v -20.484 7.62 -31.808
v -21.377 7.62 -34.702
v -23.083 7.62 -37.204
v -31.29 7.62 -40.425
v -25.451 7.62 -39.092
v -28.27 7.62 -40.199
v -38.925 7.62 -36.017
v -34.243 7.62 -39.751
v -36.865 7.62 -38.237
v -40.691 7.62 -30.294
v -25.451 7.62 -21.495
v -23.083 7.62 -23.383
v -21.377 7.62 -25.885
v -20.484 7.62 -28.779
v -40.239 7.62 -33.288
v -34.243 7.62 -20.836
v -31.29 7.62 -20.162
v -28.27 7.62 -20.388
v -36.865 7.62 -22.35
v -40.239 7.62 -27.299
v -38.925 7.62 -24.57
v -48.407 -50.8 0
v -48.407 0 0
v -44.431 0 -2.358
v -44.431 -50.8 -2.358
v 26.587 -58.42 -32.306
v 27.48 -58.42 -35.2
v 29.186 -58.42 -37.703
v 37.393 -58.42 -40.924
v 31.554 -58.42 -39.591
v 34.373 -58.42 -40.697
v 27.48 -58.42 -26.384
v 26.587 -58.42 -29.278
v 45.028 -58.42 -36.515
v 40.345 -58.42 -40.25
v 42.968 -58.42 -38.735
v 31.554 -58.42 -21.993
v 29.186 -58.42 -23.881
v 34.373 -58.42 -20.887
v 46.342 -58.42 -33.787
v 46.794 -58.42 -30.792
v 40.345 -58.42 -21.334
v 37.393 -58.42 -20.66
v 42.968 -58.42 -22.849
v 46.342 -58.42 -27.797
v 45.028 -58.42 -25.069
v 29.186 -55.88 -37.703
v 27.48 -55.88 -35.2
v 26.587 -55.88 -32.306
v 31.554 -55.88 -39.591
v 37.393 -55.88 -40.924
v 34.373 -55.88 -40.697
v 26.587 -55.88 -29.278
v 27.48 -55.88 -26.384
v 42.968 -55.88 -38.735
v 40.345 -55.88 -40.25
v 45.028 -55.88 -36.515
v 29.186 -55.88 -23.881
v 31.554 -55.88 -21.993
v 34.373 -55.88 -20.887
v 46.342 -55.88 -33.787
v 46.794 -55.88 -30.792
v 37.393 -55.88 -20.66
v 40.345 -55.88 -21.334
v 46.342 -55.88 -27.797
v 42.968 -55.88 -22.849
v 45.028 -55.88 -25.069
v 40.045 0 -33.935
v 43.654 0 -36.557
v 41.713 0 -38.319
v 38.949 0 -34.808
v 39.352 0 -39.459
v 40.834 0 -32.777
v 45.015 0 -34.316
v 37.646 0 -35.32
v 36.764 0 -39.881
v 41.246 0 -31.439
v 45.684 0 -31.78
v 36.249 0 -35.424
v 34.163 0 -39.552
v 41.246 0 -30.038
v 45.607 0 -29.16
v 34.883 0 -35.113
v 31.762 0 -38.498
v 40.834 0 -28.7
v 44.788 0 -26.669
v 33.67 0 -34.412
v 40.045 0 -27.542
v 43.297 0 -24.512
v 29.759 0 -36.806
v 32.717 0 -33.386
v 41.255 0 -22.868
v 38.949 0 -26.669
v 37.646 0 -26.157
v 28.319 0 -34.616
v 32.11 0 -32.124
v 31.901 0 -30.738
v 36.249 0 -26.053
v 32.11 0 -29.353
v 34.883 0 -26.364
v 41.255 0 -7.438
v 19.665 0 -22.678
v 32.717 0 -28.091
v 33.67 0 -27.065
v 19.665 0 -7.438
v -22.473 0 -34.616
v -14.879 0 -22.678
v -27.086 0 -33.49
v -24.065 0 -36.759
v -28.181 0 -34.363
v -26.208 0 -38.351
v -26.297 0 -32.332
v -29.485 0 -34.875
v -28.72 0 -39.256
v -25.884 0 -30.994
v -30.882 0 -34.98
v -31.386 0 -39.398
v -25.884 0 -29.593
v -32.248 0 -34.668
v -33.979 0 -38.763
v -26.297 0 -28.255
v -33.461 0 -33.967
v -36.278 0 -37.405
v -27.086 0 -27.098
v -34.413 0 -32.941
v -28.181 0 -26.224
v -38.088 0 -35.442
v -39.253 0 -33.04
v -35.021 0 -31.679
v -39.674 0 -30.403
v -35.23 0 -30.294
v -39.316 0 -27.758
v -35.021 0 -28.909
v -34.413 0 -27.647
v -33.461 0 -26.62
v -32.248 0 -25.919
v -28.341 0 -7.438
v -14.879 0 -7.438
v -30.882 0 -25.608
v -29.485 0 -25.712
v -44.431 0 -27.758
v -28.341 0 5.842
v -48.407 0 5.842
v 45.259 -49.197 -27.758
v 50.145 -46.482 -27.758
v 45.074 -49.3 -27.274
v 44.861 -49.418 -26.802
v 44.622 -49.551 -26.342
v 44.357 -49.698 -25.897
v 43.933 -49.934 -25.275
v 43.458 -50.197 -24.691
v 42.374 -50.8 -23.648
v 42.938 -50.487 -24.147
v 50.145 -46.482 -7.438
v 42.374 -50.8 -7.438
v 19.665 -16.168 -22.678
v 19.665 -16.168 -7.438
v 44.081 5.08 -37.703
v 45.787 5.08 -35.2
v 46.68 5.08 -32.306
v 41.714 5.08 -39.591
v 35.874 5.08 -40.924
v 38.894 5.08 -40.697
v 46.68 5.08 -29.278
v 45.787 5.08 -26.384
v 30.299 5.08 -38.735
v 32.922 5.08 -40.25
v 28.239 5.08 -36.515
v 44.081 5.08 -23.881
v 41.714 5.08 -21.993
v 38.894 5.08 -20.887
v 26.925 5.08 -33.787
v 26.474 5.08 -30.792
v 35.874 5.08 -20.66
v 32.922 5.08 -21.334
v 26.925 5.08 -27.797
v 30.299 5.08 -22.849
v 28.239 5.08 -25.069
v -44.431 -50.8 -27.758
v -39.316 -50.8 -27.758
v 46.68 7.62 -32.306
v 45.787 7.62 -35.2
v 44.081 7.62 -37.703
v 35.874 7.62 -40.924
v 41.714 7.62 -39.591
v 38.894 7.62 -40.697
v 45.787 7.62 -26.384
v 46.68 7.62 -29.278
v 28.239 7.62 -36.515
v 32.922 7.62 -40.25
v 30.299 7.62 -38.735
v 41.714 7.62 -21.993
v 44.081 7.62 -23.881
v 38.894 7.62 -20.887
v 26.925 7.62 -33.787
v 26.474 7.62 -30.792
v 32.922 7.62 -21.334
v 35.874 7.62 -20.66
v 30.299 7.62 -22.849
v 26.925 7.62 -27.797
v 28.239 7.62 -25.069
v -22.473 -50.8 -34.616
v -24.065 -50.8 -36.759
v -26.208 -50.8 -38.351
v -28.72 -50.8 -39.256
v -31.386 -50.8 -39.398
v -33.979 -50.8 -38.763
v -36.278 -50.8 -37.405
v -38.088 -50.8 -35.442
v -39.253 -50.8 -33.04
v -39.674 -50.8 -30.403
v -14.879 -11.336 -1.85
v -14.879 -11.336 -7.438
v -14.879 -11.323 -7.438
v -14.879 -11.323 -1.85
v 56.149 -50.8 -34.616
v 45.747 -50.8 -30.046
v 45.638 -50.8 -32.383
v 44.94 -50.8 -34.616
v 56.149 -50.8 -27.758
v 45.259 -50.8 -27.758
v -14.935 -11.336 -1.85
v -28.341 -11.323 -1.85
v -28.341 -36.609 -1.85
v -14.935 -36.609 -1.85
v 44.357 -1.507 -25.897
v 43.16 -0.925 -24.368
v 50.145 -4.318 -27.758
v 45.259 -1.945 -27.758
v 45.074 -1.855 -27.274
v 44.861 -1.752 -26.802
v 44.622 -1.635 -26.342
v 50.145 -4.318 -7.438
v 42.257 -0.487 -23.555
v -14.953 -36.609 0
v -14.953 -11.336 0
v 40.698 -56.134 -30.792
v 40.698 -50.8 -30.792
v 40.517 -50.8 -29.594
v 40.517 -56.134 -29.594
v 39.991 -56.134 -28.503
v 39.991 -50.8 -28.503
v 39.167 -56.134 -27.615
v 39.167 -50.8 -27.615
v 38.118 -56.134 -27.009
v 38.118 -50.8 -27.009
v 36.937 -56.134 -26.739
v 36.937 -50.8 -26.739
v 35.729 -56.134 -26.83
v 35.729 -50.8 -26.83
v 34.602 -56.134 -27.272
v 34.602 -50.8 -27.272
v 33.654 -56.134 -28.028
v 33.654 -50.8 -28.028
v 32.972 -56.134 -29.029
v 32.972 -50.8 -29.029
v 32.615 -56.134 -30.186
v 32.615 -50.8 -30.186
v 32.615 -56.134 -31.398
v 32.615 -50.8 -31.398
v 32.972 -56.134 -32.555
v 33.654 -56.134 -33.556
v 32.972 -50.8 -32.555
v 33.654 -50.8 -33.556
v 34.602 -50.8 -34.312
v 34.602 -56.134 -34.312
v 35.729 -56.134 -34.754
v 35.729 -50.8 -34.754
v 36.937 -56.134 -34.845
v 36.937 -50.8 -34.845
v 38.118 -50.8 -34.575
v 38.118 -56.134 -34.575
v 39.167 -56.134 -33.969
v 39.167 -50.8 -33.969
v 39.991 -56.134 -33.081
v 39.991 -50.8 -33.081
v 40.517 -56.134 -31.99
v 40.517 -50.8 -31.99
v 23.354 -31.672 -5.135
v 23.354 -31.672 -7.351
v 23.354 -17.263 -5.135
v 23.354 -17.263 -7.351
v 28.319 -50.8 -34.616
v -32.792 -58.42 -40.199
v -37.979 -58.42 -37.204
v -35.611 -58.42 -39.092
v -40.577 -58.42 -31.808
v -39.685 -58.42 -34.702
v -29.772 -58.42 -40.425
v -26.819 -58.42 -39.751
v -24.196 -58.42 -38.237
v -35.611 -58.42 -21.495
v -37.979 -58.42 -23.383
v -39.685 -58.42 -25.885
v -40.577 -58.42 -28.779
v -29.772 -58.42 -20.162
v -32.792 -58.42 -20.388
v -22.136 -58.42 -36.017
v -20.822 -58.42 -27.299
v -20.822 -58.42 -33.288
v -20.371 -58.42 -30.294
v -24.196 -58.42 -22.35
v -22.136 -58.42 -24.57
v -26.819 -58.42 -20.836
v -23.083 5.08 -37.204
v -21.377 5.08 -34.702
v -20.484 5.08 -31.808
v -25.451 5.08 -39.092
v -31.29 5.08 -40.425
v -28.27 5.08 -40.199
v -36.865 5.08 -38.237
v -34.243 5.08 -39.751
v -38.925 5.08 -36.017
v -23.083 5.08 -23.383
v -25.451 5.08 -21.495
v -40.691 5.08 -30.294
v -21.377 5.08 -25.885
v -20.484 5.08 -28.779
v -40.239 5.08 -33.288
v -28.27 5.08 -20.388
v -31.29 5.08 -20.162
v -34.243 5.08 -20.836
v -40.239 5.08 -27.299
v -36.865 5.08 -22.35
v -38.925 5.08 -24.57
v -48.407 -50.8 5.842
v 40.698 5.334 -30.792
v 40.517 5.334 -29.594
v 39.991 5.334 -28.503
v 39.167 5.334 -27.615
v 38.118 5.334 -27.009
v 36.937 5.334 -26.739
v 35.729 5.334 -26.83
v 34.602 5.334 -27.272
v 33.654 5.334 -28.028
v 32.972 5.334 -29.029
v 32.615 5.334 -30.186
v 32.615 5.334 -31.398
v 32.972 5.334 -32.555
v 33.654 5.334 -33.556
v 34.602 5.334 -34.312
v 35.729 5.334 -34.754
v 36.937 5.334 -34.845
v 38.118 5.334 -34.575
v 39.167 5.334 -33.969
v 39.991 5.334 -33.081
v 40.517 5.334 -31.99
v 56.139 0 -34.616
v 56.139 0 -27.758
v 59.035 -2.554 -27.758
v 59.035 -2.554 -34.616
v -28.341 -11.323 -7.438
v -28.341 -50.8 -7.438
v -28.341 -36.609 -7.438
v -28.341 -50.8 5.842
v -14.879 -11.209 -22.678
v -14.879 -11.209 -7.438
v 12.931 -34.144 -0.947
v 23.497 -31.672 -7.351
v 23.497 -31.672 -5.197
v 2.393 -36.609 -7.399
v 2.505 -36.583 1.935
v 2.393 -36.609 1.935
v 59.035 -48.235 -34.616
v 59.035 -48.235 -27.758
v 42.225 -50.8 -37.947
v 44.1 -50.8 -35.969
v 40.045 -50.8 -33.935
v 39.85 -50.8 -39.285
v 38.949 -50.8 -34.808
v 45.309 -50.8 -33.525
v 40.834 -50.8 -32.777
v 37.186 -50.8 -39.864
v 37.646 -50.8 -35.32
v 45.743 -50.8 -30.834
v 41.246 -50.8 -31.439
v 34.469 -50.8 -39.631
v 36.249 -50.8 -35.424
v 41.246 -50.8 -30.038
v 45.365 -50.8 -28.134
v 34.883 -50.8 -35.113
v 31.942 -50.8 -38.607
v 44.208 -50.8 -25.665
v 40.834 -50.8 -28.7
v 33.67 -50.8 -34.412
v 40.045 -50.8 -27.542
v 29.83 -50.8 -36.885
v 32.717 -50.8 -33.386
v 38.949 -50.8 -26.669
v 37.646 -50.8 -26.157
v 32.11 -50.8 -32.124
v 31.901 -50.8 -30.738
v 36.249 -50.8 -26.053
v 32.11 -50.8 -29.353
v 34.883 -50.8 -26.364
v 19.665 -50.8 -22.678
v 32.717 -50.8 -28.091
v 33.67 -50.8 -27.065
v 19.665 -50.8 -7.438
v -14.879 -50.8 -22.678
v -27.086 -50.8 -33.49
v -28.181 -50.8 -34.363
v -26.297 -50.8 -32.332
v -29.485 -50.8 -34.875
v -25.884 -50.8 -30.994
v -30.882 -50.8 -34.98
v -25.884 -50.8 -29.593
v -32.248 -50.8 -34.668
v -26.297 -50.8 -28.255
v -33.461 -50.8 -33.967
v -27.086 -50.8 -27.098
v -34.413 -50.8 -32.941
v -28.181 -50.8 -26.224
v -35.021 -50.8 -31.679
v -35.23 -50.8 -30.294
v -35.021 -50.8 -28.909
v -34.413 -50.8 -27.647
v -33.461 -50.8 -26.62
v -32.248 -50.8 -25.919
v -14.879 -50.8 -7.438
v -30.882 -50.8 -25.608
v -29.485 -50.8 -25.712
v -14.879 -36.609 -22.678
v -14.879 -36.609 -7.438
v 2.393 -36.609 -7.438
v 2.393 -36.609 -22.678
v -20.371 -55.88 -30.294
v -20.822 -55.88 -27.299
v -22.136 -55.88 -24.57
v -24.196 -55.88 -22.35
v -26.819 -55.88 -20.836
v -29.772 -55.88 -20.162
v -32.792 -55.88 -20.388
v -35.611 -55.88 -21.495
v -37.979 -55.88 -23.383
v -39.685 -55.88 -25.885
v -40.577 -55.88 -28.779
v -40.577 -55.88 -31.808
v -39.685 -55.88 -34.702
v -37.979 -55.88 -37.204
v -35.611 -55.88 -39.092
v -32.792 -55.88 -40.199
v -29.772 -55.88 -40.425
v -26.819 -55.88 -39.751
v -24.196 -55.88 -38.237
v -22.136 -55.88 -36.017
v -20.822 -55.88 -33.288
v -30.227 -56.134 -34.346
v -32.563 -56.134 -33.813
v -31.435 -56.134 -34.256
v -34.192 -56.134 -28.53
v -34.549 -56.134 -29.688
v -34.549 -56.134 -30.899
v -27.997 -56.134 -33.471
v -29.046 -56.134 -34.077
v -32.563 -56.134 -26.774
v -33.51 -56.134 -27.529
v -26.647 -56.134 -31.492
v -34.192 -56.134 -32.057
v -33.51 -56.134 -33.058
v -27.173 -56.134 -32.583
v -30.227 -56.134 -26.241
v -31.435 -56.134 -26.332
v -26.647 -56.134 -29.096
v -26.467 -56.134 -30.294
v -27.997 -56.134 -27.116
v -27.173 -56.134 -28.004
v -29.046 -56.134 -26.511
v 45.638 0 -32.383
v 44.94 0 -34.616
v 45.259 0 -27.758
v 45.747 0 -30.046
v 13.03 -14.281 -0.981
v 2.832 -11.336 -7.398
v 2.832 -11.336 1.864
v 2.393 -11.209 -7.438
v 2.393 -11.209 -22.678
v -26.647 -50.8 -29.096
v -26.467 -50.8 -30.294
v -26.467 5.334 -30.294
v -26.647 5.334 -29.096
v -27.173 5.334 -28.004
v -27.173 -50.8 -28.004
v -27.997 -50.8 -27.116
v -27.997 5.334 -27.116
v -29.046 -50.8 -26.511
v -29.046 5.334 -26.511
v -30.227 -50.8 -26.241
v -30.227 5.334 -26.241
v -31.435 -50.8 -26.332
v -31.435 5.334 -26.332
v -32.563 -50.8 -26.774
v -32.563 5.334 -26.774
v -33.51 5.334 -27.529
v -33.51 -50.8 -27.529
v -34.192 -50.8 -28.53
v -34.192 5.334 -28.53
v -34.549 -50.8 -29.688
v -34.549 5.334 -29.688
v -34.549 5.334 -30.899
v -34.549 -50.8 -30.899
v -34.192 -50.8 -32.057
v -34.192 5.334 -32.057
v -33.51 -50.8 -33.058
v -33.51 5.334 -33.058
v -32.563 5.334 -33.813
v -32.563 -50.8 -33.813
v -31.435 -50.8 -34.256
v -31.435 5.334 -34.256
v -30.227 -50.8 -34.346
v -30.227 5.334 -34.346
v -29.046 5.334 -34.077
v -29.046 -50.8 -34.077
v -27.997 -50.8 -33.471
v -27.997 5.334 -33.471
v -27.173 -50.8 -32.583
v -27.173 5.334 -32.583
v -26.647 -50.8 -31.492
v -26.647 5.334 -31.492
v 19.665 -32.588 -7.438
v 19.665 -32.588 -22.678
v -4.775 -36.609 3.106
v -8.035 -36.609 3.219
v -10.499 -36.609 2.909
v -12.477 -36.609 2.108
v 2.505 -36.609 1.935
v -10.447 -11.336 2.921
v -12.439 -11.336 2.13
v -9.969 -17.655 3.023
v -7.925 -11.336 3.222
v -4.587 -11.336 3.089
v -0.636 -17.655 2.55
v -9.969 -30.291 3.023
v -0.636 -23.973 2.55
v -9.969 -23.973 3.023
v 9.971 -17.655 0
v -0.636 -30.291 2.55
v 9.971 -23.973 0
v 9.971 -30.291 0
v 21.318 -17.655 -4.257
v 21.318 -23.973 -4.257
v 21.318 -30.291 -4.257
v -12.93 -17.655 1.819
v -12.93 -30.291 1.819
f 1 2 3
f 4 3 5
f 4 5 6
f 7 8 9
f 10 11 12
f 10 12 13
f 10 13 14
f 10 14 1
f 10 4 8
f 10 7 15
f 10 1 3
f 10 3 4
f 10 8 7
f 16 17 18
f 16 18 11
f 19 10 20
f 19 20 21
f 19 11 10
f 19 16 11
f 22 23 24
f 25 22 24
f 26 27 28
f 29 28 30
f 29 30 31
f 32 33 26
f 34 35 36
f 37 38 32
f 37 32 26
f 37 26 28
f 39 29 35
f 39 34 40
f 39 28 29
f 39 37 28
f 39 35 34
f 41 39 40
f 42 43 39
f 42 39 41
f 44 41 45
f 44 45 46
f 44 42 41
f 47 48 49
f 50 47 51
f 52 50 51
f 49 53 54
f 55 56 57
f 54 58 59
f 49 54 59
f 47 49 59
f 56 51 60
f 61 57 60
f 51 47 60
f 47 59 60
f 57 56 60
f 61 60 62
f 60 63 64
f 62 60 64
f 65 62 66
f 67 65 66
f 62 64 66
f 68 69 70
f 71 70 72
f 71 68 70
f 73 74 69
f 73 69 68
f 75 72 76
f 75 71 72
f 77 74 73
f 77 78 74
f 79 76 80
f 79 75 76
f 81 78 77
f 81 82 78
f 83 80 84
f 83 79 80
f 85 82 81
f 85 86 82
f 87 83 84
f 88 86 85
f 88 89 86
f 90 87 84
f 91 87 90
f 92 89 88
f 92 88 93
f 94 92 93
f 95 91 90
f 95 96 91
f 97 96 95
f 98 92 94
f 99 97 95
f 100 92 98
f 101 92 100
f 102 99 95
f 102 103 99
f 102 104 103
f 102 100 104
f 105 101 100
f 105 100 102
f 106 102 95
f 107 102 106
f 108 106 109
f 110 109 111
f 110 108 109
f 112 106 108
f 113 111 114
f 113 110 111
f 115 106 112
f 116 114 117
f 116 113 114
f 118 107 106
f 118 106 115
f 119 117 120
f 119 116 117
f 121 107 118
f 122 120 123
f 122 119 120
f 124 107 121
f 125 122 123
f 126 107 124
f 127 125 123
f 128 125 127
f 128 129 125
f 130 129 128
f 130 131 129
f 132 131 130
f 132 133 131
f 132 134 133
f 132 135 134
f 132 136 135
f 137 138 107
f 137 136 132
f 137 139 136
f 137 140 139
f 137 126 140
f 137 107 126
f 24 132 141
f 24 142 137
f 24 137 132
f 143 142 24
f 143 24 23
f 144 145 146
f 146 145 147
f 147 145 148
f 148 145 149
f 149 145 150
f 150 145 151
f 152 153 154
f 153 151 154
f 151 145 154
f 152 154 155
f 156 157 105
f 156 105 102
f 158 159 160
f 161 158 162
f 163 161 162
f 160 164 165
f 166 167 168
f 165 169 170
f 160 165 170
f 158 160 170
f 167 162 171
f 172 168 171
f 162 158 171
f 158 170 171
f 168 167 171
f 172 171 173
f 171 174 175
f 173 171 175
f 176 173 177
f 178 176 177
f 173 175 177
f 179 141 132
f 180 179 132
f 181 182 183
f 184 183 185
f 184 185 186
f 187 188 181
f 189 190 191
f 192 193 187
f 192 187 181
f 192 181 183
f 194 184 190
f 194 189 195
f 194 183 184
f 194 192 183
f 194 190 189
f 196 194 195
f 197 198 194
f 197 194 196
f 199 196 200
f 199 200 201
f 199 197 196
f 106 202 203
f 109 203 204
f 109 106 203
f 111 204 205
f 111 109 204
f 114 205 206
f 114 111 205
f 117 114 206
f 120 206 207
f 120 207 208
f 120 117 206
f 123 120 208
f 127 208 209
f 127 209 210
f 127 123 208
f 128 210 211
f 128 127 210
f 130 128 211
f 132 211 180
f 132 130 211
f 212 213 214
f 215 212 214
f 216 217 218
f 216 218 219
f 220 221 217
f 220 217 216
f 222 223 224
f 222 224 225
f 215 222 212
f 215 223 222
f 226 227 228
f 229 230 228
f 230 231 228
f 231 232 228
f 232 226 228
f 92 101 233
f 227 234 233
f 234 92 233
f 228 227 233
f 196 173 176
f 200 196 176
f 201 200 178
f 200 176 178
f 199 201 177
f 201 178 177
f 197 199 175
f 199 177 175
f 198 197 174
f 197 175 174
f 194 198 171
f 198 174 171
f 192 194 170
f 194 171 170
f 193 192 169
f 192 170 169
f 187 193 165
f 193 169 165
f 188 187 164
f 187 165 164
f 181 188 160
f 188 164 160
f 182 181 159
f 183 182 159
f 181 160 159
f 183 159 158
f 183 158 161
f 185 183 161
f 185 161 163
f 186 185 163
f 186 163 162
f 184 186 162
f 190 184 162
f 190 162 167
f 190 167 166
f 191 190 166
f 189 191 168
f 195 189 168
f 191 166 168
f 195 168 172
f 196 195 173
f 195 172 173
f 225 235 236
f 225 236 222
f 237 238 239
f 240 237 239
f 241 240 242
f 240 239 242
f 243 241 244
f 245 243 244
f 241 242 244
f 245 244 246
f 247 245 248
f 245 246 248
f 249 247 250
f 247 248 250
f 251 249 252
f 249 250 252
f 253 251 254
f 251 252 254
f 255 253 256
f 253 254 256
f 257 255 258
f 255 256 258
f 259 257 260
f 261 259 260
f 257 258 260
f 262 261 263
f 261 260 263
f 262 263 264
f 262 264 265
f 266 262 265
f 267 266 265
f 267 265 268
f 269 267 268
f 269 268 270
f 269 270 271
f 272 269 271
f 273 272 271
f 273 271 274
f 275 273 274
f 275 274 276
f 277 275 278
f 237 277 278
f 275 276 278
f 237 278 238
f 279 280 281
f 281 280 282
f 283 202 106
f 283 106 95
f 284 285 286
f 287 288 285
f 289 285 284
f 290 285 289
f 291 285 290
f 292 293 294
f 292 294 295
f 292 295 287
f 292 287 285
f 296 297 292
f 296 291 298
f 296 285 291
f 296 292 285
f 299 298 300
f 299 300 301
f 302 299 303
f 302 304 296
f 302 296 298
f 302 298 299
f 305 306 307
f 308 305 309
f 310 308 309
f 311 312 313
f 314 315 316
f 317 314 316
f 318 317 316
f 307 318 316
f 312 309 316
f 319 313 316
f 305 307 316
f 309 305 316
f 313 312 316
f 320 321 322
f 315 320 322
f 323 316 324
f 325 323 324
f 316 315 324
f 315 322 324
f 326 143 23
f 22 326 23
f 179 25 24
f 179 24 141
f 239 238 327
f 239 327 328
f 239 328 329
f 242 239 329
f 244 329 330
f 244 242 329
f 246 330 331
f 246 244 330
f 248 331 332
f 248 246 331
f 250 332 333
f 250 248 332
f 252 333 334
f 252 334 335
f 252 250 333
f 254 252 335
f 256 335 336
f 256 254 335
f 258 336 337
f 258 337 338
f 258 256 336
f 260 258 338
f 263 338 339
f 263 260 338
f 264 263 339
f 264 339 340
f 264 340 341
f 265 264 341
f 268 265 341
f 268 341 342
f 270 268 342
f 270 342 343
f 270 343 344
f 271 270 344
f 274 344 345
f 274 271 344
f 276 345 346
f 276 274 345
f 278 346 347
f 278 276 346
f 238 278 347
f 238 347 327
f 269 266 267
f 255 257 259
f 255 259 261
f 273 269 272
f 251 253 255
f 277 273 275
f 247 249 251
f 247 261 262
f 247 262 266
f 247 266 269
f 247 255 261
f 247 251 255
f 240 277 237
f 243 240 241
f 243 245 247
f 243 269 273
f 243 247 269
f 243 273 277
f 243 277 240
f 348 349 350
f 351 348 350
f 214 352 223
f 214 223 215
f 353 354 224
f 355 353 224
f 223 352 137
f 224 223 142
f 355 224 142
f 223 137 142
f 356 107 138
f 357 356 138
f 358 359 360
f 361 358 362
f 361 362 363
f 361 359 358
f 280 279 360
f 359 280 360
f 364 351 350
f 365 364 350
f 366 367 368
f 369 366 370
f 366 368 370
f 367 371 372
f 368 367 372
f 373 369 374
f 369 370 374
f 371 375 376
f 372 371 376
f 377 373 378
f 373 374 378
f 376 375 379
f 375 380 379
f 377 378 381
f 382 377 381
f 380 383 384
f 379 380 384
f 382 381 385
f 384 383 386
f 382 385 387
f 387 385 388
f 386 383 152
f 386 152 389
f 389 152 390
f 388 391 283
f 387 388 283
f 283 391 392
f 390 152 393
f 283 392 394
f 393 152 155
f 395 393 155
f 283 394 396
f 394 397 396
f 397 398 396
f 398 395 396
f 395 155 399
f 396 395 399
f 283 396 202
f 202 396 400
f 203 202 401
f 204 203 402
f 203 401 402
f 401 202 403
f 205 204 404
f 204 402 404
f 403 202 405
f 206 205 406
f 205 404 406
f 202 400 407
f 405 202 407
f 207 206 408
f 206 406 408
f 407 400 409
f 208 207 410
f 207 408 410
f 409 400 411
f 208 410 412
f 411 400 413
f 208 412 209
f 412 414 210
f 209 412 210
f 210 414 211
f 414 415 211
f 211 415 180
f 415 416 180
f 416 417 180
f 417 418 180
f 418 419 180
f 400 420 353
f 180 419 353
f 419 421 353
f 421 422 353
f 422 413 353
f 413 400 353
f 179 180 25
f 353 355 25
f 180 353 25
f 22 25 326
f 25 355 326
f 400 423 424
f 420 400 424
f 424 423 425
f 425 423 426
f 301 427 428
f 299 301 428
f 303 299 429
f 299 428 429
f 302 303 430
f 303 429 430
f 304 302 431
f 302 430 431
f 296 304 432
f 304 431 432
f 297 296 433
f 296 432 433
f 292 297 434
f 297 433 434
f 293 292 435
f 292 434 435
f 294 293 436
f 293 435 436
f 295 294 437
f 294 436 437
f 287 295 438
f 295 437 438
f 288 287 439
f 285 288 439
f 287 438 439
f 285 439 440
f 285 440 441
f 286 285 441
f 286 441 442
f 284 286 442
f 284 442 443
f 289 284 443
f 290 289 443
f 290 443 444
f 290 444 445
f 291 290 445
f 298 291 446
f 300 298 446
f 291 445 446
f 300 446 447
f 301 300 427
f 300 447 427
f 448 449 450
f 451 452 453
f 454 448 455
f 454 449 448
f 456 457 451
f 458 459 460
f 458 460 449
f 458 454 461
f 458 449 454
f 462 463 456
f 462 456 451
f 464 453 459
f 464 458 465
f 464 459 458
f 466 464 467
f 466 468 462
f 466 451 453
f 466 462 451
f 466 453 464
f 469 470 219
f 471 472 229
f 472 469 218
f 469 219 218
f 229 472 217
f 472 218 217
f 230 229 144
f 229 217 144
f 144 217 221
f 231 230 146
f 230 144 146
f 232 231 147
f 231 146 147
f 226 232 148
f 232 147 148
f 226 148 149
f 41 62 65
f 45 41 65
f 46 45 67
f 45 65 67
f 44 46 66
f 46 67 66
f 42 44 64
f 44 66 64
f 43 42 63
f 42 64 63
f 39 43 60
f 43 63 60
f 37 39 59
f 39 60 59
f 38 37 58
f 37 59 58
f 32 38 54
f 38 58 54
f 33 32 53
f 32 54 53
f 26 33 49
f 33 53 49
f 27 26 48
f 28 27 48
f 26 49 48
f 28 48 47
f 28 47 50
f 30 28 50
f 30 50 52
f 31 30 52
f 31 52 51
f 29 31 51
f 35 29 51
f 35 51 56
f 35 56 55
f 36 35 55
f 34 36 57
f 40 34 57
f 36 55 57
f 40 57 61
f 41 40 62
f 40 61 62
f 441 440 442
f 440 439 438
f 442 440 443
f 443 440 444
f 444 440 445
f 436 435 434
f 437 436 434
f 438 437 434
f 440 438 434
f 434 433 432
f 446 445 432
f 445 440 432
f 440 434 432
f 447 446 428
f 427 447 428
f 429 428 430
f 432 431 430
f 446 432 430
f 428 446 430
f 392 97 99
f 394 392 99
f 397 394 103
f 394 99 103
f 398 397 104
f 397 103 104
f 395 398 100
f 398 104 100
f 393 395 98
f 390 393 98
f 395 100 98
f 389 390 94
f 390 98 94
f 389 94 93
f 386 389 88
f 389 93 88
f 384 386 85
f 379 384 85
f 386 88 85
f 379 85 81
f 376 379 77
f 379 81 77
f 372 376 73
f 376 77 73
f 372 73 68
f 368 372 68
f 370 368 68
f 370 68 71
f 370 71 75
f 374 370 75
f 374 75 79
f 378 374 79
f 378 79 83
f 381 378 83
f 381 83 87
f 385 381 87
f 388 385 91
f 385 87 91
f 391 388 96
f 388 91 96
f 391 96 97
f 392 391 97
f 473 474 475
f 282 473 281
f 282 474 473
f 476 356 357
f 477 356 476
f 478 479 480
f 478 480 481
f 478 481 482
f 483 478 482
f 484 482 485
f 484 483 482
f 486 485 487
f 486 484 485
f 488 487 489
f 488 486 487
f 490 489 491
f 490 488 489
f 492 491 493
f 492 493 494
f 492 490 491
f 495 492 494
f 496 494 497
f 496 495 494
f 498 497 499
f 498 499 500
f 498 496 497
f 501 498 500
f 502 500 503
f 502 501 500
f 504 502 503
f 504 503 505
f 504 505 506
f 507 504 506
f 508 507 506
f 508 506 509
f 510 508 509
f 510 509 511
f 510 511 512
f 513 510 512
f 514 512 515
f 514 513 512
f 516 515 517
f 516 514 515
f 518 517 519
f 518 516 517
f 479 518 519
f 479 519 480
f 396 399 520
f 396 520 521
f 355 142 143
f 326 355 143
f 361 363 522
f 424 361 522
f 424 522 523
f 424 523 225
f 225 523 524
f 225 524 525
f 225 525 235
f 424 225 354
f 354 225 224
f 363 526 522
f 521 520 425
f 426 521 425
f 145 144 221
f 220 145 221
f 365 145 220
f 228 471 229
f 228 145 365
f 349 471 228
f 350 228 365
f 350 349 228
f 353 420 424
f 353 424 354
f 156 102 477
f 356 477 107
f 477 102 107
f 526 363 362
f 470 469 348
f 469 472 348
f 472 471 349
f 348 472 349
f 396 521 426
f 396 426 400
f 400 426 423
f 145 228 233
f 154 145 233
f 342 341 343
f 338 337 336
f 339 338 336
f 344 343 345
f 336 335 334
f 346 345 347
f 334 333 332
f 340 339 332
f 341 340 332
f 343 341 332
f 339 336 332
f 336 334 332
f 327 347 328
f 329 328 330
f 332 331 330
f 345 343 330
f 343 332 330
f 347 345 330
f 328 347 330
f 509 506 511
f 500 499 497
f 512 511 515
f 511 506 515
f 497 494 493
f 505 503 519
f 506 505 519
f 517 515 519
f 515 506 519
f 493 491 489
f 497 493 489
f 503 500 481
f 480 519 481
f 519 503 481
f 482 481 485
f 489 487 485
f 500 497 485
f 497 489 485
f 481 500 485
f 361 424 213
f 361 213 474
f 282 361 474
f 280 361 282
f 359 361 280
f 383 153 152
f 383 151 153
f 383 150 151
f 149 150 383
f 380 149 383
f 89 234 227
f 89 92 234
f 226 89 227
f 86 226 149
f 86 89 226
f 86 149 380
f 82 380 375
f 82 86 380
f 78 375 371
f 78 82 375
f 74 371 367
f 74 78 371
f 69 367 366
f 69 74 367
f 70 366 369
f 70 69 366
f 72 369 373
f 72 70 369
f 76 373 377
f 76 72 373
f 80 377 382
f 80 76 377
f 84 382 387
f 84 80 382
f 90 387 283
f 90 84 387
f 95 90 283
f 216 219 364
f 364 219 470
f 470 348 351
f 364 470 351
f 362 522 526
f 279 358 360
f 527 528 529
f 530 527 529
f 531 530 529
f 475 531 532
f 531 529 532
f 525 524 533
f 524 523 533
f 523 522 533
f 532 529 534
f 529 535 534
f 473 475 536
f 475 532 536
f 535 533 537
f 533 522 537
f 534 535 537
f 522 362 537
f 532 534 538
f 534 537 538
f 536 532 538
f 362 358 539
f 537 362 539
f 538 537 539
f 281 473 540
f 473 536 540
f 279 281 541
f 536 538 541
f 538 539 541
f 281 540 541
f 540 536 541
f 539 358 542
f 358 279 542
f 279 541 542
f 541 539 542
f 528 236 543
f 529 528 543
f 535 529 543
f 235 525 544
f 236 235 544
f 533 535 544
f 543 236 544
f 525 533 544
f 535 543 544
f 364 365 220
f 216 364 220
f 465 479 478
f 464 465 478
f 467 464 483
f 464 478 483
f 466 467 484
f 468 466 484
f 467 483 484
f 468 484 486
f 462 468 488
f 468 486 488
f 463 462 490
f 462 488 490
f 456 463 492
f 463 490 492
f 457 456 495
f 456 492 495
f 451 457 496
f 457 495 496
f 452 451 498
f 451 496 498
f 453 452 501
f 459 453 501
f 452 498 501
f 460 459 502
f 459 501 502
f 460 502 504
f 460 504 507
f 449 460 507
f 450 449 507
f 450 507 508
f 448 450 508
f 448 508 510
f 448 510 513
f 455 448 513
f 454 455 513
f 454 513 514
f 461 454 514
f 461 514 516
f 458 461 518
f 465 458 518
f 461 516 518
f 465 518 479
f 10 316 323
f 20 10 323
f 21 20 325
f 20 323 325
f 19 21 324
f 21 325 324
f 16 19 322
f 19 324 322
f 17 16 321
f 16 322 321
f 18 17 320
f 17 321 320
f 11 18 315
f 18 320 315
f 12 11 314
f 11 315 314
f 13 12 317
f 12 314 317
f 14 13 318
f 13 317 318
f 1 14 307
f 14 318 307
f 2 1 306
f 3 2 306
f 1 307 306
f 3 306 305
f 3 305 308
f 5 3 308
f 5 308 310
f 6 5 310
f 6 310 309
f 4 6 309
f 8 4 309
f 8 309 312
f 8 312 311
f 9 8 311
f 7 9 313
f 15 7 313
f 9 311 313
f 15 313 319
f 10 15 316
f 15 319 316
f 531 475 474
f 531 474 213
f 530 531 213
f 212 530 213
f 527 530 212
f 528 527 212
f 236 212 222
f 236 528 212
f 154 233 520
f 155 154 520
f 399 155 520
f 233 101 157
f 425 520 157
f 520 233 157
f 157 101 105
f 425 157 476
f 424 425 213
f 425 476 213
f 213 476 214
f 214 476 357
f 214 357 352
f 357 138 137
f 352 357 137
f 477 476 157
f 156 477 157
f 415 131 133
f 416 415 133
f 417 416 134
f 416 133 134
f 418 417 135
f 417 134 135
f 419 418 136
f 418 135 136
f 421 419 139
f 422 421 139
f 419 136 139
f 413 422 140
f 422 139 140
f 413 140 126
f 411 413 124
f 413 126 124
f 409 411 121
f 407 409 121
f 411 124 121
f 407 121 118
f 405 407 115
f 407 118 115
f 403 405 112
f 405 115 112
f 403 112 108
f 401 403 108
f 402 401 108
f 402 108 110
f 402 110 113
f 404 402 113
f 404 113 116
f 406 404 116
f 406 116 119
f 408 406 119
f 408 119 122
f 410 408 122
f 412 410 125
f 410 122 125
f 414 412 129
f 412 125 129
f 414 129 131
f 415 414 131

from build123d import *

# Parameters (mm, degrees)
F1_DEPTH      = 50.8
F2_R          = 9.144
F3_DEPTH      = 54.864
F4_R          = 4.064
F5_DEPTH      = 56.134
F5_DEPTH_BACK = 5.334
F7_START      = 5.08
F6_R          = 10.16
F7_DEPTH      = 2.54
F9_START      = 5.08
F8_R          = 10.16
F9_DEPTH      = 2.54
F10_W         = 34.544
F10_H         = 25.4
F11_DEPTH     = 15.24
F12_W         = 13.462
F12_H         = 25.2863662317
F13_DEPTH     = 5.588
F15_DEPTH     = 25.273
F17_DEPTH     = 9.3726
F19_DEPTH     = 20.32
F20_R         = 9.144
F20_R_2       = 4.699
F21_DEPTH     = 50.8
F22_W         = 6.9764815271
F22_H         = 14.4462492317
F23_DEPTH     = 11.176
F25_DEPTH     = 25.4
F27_DEPTH     = 15.24


with BuildPart() as f1:
    # F0 (on Front) → F1 (new body)
    with BuildSketch(Plane.XZ):
        with BuildLine():
            ThreePointArc((-39.3160984872, -27.7575049432), (-33.9790579937, -38.7625558195), (-22.4726634651, -34.6155049432))
            ThreePointArc((-22.4726634651, -34.6155049432), (-21.6624499567, -32.5217293492), (-21.3868406955, -30.2936400999))
            ThreePointArc((-21.3868406955, -30.2936400999), (-29.2501497194, -21.2397698433), (-39.3160984872, -27.7575049432))
        make_face()
        with BuildLine():
            ThreePointArc((-21.3868406955, -30.2936400999), (-21.6624499567, -32.5217293492), (-22.4726634651, -34.6155049432))
            Line((-22.4726634651, -34.6155049432), (28.3273365349, -34.6155049432))
            ThreePointArc((28.3273365349, -34.6155049432), (34.6764494687, -21.8598808978), (45.7775638516, -30.7919825146))
            ThreePointArc((45.7775638516, -30.7919825146), (45.5656654684, -32.7490968975), (44.9397911684, -34.6155049432))
            Line((44.9397911684, -34.6155049432), (59.0346912427, -34.6155049432))
            Line((59.0346912427, -34.6155049432), (59.0346912427, -27.7575049432))
            Line((59.0346912427, -27.7575049432), (50.1446912427, -27.7575049432))
            Line((50.1446912427, -27.7575049432), (50.1446912427, -7.4375049432))
            Line((50.1446912427, -7.4375049432), (19.6646912427, -7.4375049432))
            Line((19.6646912427, -7.4375049432), (19.6646912427, -22.6775049432))
            Line((19.6646912427, -22.6775049432), (-14.8793087573, -22.6775049432))
            Line((-14.8793087573, -22.6775049432), (-14.8793087573, -7.4375049432))
            Line((-14.8793087573, -7.4375049432), (-28.3413087573, -7.4375049432))
            Line((-28.3413087573, -7.4375049432), (-28.3413087573, 5.842))
            Line((-28.3413087573, 5.842), (-48.4073087573, 5.842))
            Line((-48.4073087573, 5.842), (-48.4073087573, 0))
            Line((-48.4073087573, 0), (-44.4313660264, -2.3575049432))
            Line((-44.4313660264, -2.3575049432), (-44.4313660264, -27.7575049432))
            Line((-44.4313660264, -27.7575049432), (-39.3160984872, -27.7575049432))
            ThreePointArc((-39.3160984872, -27.7575049432), (-29.2501497194, -21.2397698433), (-21.3868406955, -30.2936400999))
        make_face()
        with BuildLine():
            ThreePointArc((45.7775638516, -30.7919825146), (34.6764494687, -21.8598808978), (28.3273365349, -34.6155049432))
            ThreePointArc((28.3273365349, -34.6155049432), (36.6335638516, -39.9359825146), (44.9397911684, -34.6155049432))
            ThreePointArc((44.9397911684, -34.6155049432), (45.5656654684, -32.7490968975), (45.7775638516, -30.7919825146))
        make_face()
    extrude(amount=F1_DEPTH)

    # F2 (on face) → F3 (cut)
    with BuildSketch(Plane.XZ.offset(50.8)):
        with Locations((-30.5308406955, -30.2936400999)):
            Circle(F2_R)
        with Locations((36.6335638516, -30.7919825146)):
            Circle(F2_R)
    extrude(amount=-F3_DEPTH, mode=Mode.SUBTRACT)

    # F10 (on face) → F11 (join)
    with BuildSketch(Plane.XY.offset(-22.6775049432)):
        with Locations((2.3926912427, -23.9094186902)):
            Rectangle(F10_W, F10_H)
    extrude(amount=F11_DEPTH)

    # F12 (on face) → F13 (join)
    with BuildSketch(Plane.XY.offset(-7.4375049432)):
        with Locations((-21.6103087573, -23.9662355743)):
            Rectangle(F12_W, F12_H)
    extrude(amount=F13_DEPTH)

    # F14 (on face) → F15 (join)
    with BuildSketch(Plane.XZ.offset(36.6094186902)):
        with BuildLine():
            add(Edge.make_bspline(
                [(-14.9534931406, 0), (-13.7084147885, 1.280785357), (-10.1476321192, 4.9436860046), (10.580938155, 0.3784500707), (20.8913849344, -4.0742789406), (26.1342285398, -6.3342501821), (28.4668169916, -7.3397317901)],
                knots=[0, 0, 0, 0, 0.183241401, 0.5240495941, 0.7882453676, 1, 1, 1, 1], degree=3))
            Line((-14.9534931406, 0), (-14.8793087573, -7.4375049432))
            Line((-14.8793087573, -7.4375049432), (28.4668169916, -7.3397317901))
        make_face()
    extrude(amount=-F15_DEPTH)

    # F16 (on face) → F17 (cut)
    with BuildSketch(Plane.XY.offset(-7.4375049432)):
        Polygon((2.3926912427, -11.2094186902), (28.6921481749, -18.8049337278), (28.7324799613, -11.1850404643), align=None)
        Polygon((28.6921481749, -38.0666863767), (28.7324799613, -30.4467931132), (2.3926912427, -36.6094186902), align=None)
    extrude(amount=F17_DEPTH, mode=Mode.SUBTRACT)

    # F18 (on face) → F19 (cut)
    with BuildSketch(Plane.XY.offset(-7.4375049432)):
        Polygon((50.1446912427, -4.318), (50.1446912427, 0), (41.2546912427, 0), align=None)
        Polygon((42.373785504, -50.8), (50.1446912427, -50.8), (50.1446912427, -46.482), align=None)
    extrude(amount=-F19_DEPTH, mode=Mode.SUBTRACT)

    # F20 (on face) → F21 (join)
    with BuildSketch(Plane(origin=(0, 0, 0), x_dir=(-1, 0, 0), z_dir=(0, 1, 0))):
        with Locations((30.5308406955, -30.2936400999)):
            Circle(F20_R)
        with Locations((30.5308406955, -30.2936400999)):
            Circle(F20_R_2, mode=Mode.SUBTRACT)
        with Locations((-36.5999266505, -30.7384990156)):
            Circle(F20_R)
        with Locations((-36.5999266505, -30.7384990156)):
            Circle(F20_R_2, mode=Mode.SUBTRACT)
    extrude(amount=-F21_DEPTH)

    # F22 (on face) → F23 (cut)
    with BuildSketch(Plane.XY.offset(-7.4375049432)):
        with Locations((26.8421266228, -24.4486602023)):
            Rectangle(F22_W, F22_H)
    extrude(amount=F23_DEPTH, mode=Mode.SUBTRACT)

    # F24 (on face) → F25 (cut)
    with BuildSketch(Plane.XY.offset(-27.7575049432)):
        Polygon((59.0346912427, 0), (56.1390912427, 0), (59.0346912427, -2.5536791654), align=None)
        Polygon((59.0346912427, -48.2346), (56.1494703707, -50.8), (59.0346912427, -50.8), align=None)
    extrude(amount=-F25_DEPTH, mode=Mode.SUBTRACT)

    # F26 (on face) → F27 (cut)
    with BuildSketch(Plane.XY.offset(-7.4375049432)):
        Polygon((19.6646912427, -16.1684937775), (19.6646912427, -11.2094186902), (2.3926912427, -11.2094186902), align=None)
        Polygon((2.3926912427, -36.6094186902), (19.6646912427, -36.6094186902), (19.6646912427, -32.5878895819), align=None)
    extrude(amount=-F27_DEPTH, mode=Mode.SUBTRACT)


with BuildPart() as f5:
    # F4 (on face) → F5 (new body, two sides)
    with BuildSketch(Plane.XZ.offset(50.8)) as f5_sk:
        with Locations((36.6335638516, -30.7919825146)):
            Circle(F4_R)
    extrude(amount=-F5_DEPTH)
    extrude(f5_sk.sketch, amount=F5_DEPTH_BACK)


with BuildPart() as f5b:
    # F4 (on face) → F5, piece 2 (new body, two sides)
    with BuildSketch(Plane.XZ.offset(50.8)) as f5_2_sk:
        with Locations((-30.5308406955, -30.2936400999)):
            Circle(F4_R)
    extrude(amount=-F5_DEPTH)
    extrude(f5_2_sk.sketch, amount=F5_DEPTH_BACK)


with BuildPart() as f7:
    # F6 (on face) → F7 (new body)
    with BuildSketch(Plane.XZ.offset(50.8).offset(F7_START)):
        with Locations((-30.5308406955, -30.2936400999)):
            Circle(F6_R)
    extrude(amount=F7_DEPTH)


with BuildPart() as f7b:
    # F6 (on face) → F7, piece 2 (new body)
    with BuildSketch(Plane.XZ.offset(50.8).offset(F7_START)):
        with Locations((36.6335638516, -30.7919825146)):
            Circle(F6_R)
    extrude(amount=F7_DEPTH)


with BuildPart() as f9:
    # F8 (on face) → F9 (new body)
    with BuildSketch(Plane(origin=(0, 0, 0), x_dir=(-1, 0, 0), z_dir=(0, 1, 0)).offset(F9_START)):
        with Locations((-36.6335638516, -30.7919825146)):
            Circle(F8_R)
    extrude(amount=F9_DEPTH)


with BuildPart() as f9b:
    # F8 (on face) → F9, piece 2 (new body)
    with BuildSketch(Plane(origin=(0, 0, 0), x_dir=(-1, 0, 0), z_dir=(0, 1, 0)).offset(F9_START)):
        with Locations((30.5308406955, -30.2936400999)):
            Circle(F8_R)
    extrude(amount=F9_DEPTH)


solid = Compound([f1.part, f5.part, f5b.part, f7.part, f7b.part, f9.part, f9b.part])
